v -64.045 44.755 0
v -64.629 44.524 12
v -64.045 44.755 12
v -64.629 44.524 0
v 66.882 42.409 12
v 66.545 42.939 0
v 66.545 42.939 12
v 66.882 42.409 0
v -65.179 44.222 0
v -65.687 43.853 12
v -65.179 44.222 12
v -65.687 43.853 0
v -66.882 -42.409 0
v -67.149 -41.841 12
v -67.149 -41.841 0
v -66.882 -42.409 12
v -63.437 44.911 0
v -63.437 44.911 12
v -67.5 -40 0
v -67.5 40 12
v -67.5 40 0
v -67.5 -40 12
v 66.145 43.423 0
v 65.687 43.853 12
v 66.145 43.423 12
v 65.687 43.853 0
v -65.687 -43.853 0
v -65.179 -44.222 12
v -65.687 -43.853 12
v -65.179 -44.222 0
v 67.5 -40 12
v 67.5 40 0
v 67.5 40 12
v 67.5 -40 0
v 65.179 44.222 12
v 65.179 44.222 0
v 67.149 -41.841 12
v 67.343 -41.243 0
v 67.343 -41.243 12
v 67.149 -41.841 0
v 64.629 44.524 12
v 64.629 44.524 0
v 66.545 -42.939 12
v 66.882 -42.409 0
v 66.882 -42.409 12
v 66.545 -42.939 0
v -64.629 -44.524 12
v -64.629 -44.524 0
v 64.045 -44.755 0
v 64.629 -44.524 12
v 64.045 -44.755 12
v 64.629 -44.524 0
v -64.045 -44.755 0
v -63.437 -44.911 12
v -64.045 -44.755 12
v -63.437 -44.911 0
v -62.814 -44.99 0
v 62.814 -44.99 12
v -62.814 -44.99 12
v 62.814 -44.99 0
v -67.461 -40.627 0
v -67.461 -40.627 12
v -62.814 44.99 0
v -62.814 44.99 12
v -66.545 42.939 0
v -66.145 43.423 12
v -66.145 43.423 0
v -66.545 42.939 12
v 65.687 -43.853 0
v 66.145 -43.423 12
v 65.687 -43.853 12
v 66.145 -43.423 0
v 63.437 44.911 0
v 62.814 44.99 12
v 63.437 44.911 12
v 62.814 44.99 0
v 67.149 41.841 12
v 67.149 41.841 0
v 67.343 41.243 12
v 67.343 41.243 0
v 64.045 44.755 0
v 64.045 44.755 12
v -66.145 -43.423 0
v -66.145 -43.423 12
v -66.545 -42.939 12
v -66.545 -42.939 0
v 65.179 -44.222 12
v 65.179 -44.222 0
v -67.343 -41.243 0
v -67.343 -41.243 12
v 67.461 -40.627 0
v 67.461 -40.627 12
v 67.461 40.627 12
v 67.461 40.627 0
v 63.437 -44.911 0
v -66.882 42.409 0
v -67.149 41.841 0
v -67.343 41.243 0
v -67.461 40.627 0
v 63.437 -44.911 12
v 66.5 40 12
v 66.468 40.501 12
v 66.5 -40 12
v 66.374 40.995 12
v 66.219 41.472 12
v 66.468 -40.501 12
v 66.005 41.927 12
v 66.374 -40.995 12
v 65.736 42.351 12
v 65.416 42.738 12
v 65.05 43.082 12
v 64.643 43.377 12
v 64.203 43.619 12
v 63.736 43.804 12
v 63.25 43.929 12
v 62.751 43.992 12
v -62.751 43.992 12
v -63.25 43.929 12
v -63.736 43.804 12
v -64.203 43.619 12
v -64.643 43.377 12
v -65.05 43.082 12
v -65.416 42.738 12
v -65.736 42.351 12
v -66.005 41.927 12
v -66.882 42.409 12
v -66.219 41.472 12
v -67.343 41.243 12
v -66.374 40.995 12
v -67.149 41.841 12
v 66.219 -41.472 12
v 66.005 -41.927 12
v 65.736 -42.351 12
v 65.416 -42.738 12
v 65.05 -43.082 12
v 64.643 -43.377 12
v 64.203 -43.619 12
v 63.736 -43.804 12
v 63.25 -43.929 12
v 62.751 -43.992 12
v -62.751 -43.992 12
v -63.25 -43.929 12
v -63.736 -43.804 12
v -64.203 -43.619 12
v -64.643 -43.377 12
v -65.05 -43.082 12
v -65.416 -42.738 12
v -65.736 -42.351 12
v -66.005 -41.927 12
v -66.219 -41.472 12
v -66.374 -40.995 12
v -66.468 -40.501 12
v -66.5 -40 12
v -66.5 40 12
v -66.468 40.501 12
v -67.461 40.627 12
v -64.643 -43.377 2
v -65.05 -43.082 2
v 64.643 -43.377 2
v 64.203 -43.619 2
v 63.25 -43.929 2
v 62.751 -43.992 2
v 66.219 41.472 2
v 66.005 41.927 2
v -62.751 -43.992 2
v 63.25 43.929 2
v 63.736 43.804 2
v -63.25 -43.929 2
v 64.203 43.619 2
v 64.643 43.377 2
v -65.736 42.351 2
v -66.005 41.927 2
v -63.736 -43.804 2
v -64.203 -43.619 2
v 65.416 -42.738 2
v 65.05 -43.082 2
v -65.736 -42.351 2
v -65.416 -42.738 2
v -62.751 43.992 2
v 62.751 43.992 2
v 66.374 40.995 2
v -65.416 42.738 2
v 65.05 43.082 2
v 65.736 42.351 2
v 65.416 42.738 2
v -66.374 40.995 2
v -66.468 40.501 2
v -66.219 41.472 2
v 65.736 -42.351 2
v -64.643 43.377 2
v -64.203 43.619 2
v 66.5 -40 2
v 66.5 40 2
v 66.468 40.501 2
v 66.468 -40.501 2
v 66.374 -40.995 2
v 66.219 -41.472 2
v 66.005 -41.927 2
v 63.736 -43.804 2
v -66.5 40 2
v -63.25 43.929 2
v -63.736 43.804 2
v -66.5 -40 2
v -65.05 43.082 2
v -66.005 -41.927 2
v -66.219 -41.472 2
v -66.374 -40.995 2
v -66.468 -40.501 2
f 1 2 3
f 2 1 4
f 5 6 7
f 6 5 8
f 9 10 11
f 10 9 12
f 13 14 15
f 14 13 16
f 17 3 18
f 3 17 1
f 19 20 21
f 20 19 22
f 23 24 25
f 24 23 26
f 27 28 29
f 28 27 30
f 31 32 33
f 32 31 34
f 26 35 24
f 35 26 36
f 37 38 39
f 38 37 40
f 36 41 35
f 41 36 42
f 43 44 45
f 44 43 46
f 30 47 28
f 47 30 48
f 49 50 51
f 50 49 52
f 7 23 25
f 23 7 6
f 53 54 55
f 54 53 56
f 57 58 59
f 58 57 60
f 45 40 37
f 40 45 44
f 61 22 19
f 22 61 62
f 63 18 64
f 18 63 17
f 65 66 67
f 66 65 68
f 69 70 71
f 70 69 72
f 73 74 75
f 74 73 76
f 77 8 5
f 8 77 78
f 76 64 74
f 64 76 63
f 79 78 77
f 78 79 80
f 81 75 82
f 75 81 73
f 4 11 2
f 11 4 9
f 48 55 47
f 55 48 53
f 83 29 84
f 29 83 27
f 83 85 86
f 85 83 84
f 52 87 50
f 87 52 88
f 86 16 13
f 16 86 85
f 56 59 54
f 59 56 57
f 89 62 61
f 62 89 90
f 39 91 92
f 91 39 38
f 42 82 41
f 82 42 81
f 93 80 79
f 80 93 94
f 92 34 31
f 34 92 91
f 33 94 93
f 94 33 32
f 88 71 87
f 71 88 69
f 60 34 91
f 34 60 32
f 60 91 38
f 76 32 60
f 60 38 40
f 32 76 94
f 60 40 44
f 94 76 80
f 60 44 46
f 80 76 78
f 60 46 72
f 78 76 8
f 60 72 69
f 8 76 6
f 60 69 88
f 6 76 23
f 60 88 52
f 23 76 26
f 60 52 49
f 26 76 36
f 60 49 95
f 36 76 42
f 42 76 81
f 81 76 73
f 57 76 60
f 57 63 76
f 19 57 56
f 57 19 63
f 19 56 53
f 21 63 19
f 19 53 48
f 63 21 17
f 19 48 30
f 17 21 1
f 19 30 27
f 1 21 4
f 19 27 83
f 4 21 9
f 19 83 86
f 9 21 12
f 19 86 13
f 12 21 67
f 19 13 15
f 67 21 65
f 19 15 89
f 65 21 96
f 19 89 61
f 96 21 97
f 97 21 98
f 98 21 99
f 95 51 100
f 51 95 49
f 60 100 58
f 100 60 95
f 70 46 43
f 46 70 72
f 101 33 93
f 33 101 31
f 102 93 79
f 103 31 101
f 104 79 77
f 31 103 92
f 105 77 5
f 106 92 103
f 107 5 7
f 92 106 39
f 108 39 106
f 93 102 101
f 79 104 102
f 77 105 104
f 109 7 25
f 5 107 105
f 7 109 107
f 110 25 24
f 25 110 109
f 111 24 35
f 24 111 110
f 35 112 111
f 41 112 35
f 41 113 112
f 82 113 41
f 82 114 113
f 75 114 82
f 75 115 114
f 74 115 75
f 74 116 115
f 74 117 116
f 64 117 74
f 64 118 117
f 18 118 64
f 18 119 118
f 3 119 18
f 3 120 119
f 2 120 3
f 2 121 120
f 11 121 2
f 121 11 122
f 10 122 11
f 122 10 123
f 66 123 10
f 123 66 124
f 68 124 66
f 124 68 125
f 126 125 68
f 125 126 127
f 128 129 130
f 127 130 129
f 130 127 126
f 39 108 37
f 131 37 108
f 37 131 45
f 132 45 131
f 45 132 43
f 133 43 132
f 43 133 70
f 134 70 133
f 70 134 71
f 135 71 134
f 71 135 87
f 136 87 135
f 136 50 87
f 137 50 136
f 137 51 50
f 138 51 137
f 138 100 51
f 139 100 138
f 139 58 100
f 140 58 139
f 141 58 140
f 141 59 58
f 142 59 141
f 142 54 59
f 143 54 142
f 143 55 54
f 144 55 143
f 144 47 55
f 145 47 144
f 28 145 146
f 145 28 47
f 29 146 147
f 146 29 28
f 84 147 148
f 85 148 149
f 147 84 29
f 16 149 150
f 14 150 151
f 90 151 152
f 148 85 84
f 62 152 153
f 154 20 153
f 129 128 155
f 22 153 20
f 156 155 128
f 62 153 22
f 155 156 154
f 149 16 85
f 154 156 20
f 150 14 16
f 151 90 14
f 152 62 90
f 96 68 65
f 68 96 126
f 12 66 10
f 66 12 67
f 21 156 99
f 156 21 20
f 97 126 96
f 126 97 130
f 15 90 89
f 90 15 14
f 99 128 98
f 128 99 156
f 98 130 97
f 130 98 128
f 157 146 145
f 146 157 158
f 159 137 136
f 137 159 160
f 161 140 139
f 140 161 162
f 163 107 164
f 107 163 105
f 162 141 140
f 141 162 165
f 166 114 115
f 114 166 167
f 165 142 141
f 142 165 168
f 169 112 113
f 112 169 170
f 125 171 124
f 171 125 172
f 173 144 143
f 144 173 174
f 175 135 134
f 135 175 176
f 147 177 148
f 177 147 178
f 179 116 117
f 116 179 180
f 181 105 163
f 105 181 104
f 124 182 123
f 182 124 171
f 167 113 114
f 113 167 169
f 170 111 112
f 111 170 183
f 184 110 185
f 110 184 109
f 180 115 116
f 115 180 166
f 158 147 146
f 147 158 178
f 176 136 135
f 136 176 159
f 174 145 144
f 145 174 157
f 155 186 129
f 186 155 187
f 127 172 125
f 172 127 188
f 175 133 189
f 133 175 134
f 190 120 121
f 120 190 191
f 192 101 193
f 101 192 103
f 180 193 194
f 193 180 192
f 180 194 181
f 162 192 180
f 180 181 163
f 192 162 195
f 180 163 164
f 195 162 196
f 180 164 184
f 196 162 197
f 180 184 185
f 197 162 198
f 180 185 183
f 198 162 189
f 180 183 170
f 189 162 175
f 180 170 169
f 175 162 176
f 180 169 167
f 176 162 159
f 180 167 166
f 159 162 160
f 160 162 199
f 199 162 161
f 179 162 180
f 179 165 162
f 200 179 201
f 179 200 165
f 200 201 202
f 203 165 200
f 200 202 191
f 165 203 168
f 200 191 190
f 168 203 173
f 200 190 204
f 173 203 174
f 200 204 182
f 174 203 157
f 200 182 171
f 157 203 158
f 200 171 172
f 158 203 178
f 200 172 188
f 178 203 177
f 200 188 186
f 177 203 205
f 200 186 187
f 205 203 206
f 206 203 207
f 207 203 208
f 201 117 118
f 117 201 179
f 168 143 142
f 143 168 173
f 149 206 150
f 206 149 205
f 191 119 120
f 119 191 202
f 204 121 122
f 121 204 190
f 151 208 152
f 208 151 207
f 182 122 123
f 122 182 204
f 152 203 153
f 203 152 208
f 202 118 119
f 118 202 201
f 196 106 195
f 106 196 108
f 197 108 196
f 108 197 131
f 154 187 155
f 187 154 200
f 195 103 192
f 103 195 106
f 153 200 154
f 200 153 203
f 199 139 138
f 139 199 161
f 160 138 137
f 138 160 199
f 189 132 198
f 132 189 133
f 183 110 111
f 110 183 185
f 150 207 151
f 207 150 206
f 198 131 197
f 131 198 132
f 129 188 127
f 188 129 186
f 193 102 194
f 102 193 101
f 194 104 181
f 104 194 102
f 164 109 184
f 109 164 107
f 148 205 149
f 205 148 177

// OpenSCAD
$fn = 50;


difference() {
	union() {
		hull() {
			translate(v = [-62.5000000000, 40.0000000000, 0]) {
				cylinder(h = 12, r = 5);
			}
			translate(v = [62.5000000000, 40.0000000000, 0]) {
				cylinder(h = 12, r = 5);
			}
			translate(v = [-62.5000000000, -40.0000000000, 0]) {
				cylinder(h = 12, r = 5);
			}
			translate(v = [62.5000000000, -40.0000000000, 0]) {
				cylinder(h = 12, r = 5);
			}
		}
	}
	union() {
		translate(v = [0, 0, 2]) {
			hull() {
				translate(v = [-62.5000000000, 40.0000000000, 0]) {
					cylinder(h = 10, r = 4);
				}
				translate(v = [62.5000000000, 40.0000000000, 0]) {
					cylinder(h = 10, r = 4);
				}
				translate(v = [-62.5000000000, -40.0000000000, 0]) {
					cylinder(h = 10, r = 4);
				}
				translate(v = [62.5000000000, -40.0000000000, 0]) {
					cylinder(h = 10, r = 4);
				}
			}
		}
	}
}
